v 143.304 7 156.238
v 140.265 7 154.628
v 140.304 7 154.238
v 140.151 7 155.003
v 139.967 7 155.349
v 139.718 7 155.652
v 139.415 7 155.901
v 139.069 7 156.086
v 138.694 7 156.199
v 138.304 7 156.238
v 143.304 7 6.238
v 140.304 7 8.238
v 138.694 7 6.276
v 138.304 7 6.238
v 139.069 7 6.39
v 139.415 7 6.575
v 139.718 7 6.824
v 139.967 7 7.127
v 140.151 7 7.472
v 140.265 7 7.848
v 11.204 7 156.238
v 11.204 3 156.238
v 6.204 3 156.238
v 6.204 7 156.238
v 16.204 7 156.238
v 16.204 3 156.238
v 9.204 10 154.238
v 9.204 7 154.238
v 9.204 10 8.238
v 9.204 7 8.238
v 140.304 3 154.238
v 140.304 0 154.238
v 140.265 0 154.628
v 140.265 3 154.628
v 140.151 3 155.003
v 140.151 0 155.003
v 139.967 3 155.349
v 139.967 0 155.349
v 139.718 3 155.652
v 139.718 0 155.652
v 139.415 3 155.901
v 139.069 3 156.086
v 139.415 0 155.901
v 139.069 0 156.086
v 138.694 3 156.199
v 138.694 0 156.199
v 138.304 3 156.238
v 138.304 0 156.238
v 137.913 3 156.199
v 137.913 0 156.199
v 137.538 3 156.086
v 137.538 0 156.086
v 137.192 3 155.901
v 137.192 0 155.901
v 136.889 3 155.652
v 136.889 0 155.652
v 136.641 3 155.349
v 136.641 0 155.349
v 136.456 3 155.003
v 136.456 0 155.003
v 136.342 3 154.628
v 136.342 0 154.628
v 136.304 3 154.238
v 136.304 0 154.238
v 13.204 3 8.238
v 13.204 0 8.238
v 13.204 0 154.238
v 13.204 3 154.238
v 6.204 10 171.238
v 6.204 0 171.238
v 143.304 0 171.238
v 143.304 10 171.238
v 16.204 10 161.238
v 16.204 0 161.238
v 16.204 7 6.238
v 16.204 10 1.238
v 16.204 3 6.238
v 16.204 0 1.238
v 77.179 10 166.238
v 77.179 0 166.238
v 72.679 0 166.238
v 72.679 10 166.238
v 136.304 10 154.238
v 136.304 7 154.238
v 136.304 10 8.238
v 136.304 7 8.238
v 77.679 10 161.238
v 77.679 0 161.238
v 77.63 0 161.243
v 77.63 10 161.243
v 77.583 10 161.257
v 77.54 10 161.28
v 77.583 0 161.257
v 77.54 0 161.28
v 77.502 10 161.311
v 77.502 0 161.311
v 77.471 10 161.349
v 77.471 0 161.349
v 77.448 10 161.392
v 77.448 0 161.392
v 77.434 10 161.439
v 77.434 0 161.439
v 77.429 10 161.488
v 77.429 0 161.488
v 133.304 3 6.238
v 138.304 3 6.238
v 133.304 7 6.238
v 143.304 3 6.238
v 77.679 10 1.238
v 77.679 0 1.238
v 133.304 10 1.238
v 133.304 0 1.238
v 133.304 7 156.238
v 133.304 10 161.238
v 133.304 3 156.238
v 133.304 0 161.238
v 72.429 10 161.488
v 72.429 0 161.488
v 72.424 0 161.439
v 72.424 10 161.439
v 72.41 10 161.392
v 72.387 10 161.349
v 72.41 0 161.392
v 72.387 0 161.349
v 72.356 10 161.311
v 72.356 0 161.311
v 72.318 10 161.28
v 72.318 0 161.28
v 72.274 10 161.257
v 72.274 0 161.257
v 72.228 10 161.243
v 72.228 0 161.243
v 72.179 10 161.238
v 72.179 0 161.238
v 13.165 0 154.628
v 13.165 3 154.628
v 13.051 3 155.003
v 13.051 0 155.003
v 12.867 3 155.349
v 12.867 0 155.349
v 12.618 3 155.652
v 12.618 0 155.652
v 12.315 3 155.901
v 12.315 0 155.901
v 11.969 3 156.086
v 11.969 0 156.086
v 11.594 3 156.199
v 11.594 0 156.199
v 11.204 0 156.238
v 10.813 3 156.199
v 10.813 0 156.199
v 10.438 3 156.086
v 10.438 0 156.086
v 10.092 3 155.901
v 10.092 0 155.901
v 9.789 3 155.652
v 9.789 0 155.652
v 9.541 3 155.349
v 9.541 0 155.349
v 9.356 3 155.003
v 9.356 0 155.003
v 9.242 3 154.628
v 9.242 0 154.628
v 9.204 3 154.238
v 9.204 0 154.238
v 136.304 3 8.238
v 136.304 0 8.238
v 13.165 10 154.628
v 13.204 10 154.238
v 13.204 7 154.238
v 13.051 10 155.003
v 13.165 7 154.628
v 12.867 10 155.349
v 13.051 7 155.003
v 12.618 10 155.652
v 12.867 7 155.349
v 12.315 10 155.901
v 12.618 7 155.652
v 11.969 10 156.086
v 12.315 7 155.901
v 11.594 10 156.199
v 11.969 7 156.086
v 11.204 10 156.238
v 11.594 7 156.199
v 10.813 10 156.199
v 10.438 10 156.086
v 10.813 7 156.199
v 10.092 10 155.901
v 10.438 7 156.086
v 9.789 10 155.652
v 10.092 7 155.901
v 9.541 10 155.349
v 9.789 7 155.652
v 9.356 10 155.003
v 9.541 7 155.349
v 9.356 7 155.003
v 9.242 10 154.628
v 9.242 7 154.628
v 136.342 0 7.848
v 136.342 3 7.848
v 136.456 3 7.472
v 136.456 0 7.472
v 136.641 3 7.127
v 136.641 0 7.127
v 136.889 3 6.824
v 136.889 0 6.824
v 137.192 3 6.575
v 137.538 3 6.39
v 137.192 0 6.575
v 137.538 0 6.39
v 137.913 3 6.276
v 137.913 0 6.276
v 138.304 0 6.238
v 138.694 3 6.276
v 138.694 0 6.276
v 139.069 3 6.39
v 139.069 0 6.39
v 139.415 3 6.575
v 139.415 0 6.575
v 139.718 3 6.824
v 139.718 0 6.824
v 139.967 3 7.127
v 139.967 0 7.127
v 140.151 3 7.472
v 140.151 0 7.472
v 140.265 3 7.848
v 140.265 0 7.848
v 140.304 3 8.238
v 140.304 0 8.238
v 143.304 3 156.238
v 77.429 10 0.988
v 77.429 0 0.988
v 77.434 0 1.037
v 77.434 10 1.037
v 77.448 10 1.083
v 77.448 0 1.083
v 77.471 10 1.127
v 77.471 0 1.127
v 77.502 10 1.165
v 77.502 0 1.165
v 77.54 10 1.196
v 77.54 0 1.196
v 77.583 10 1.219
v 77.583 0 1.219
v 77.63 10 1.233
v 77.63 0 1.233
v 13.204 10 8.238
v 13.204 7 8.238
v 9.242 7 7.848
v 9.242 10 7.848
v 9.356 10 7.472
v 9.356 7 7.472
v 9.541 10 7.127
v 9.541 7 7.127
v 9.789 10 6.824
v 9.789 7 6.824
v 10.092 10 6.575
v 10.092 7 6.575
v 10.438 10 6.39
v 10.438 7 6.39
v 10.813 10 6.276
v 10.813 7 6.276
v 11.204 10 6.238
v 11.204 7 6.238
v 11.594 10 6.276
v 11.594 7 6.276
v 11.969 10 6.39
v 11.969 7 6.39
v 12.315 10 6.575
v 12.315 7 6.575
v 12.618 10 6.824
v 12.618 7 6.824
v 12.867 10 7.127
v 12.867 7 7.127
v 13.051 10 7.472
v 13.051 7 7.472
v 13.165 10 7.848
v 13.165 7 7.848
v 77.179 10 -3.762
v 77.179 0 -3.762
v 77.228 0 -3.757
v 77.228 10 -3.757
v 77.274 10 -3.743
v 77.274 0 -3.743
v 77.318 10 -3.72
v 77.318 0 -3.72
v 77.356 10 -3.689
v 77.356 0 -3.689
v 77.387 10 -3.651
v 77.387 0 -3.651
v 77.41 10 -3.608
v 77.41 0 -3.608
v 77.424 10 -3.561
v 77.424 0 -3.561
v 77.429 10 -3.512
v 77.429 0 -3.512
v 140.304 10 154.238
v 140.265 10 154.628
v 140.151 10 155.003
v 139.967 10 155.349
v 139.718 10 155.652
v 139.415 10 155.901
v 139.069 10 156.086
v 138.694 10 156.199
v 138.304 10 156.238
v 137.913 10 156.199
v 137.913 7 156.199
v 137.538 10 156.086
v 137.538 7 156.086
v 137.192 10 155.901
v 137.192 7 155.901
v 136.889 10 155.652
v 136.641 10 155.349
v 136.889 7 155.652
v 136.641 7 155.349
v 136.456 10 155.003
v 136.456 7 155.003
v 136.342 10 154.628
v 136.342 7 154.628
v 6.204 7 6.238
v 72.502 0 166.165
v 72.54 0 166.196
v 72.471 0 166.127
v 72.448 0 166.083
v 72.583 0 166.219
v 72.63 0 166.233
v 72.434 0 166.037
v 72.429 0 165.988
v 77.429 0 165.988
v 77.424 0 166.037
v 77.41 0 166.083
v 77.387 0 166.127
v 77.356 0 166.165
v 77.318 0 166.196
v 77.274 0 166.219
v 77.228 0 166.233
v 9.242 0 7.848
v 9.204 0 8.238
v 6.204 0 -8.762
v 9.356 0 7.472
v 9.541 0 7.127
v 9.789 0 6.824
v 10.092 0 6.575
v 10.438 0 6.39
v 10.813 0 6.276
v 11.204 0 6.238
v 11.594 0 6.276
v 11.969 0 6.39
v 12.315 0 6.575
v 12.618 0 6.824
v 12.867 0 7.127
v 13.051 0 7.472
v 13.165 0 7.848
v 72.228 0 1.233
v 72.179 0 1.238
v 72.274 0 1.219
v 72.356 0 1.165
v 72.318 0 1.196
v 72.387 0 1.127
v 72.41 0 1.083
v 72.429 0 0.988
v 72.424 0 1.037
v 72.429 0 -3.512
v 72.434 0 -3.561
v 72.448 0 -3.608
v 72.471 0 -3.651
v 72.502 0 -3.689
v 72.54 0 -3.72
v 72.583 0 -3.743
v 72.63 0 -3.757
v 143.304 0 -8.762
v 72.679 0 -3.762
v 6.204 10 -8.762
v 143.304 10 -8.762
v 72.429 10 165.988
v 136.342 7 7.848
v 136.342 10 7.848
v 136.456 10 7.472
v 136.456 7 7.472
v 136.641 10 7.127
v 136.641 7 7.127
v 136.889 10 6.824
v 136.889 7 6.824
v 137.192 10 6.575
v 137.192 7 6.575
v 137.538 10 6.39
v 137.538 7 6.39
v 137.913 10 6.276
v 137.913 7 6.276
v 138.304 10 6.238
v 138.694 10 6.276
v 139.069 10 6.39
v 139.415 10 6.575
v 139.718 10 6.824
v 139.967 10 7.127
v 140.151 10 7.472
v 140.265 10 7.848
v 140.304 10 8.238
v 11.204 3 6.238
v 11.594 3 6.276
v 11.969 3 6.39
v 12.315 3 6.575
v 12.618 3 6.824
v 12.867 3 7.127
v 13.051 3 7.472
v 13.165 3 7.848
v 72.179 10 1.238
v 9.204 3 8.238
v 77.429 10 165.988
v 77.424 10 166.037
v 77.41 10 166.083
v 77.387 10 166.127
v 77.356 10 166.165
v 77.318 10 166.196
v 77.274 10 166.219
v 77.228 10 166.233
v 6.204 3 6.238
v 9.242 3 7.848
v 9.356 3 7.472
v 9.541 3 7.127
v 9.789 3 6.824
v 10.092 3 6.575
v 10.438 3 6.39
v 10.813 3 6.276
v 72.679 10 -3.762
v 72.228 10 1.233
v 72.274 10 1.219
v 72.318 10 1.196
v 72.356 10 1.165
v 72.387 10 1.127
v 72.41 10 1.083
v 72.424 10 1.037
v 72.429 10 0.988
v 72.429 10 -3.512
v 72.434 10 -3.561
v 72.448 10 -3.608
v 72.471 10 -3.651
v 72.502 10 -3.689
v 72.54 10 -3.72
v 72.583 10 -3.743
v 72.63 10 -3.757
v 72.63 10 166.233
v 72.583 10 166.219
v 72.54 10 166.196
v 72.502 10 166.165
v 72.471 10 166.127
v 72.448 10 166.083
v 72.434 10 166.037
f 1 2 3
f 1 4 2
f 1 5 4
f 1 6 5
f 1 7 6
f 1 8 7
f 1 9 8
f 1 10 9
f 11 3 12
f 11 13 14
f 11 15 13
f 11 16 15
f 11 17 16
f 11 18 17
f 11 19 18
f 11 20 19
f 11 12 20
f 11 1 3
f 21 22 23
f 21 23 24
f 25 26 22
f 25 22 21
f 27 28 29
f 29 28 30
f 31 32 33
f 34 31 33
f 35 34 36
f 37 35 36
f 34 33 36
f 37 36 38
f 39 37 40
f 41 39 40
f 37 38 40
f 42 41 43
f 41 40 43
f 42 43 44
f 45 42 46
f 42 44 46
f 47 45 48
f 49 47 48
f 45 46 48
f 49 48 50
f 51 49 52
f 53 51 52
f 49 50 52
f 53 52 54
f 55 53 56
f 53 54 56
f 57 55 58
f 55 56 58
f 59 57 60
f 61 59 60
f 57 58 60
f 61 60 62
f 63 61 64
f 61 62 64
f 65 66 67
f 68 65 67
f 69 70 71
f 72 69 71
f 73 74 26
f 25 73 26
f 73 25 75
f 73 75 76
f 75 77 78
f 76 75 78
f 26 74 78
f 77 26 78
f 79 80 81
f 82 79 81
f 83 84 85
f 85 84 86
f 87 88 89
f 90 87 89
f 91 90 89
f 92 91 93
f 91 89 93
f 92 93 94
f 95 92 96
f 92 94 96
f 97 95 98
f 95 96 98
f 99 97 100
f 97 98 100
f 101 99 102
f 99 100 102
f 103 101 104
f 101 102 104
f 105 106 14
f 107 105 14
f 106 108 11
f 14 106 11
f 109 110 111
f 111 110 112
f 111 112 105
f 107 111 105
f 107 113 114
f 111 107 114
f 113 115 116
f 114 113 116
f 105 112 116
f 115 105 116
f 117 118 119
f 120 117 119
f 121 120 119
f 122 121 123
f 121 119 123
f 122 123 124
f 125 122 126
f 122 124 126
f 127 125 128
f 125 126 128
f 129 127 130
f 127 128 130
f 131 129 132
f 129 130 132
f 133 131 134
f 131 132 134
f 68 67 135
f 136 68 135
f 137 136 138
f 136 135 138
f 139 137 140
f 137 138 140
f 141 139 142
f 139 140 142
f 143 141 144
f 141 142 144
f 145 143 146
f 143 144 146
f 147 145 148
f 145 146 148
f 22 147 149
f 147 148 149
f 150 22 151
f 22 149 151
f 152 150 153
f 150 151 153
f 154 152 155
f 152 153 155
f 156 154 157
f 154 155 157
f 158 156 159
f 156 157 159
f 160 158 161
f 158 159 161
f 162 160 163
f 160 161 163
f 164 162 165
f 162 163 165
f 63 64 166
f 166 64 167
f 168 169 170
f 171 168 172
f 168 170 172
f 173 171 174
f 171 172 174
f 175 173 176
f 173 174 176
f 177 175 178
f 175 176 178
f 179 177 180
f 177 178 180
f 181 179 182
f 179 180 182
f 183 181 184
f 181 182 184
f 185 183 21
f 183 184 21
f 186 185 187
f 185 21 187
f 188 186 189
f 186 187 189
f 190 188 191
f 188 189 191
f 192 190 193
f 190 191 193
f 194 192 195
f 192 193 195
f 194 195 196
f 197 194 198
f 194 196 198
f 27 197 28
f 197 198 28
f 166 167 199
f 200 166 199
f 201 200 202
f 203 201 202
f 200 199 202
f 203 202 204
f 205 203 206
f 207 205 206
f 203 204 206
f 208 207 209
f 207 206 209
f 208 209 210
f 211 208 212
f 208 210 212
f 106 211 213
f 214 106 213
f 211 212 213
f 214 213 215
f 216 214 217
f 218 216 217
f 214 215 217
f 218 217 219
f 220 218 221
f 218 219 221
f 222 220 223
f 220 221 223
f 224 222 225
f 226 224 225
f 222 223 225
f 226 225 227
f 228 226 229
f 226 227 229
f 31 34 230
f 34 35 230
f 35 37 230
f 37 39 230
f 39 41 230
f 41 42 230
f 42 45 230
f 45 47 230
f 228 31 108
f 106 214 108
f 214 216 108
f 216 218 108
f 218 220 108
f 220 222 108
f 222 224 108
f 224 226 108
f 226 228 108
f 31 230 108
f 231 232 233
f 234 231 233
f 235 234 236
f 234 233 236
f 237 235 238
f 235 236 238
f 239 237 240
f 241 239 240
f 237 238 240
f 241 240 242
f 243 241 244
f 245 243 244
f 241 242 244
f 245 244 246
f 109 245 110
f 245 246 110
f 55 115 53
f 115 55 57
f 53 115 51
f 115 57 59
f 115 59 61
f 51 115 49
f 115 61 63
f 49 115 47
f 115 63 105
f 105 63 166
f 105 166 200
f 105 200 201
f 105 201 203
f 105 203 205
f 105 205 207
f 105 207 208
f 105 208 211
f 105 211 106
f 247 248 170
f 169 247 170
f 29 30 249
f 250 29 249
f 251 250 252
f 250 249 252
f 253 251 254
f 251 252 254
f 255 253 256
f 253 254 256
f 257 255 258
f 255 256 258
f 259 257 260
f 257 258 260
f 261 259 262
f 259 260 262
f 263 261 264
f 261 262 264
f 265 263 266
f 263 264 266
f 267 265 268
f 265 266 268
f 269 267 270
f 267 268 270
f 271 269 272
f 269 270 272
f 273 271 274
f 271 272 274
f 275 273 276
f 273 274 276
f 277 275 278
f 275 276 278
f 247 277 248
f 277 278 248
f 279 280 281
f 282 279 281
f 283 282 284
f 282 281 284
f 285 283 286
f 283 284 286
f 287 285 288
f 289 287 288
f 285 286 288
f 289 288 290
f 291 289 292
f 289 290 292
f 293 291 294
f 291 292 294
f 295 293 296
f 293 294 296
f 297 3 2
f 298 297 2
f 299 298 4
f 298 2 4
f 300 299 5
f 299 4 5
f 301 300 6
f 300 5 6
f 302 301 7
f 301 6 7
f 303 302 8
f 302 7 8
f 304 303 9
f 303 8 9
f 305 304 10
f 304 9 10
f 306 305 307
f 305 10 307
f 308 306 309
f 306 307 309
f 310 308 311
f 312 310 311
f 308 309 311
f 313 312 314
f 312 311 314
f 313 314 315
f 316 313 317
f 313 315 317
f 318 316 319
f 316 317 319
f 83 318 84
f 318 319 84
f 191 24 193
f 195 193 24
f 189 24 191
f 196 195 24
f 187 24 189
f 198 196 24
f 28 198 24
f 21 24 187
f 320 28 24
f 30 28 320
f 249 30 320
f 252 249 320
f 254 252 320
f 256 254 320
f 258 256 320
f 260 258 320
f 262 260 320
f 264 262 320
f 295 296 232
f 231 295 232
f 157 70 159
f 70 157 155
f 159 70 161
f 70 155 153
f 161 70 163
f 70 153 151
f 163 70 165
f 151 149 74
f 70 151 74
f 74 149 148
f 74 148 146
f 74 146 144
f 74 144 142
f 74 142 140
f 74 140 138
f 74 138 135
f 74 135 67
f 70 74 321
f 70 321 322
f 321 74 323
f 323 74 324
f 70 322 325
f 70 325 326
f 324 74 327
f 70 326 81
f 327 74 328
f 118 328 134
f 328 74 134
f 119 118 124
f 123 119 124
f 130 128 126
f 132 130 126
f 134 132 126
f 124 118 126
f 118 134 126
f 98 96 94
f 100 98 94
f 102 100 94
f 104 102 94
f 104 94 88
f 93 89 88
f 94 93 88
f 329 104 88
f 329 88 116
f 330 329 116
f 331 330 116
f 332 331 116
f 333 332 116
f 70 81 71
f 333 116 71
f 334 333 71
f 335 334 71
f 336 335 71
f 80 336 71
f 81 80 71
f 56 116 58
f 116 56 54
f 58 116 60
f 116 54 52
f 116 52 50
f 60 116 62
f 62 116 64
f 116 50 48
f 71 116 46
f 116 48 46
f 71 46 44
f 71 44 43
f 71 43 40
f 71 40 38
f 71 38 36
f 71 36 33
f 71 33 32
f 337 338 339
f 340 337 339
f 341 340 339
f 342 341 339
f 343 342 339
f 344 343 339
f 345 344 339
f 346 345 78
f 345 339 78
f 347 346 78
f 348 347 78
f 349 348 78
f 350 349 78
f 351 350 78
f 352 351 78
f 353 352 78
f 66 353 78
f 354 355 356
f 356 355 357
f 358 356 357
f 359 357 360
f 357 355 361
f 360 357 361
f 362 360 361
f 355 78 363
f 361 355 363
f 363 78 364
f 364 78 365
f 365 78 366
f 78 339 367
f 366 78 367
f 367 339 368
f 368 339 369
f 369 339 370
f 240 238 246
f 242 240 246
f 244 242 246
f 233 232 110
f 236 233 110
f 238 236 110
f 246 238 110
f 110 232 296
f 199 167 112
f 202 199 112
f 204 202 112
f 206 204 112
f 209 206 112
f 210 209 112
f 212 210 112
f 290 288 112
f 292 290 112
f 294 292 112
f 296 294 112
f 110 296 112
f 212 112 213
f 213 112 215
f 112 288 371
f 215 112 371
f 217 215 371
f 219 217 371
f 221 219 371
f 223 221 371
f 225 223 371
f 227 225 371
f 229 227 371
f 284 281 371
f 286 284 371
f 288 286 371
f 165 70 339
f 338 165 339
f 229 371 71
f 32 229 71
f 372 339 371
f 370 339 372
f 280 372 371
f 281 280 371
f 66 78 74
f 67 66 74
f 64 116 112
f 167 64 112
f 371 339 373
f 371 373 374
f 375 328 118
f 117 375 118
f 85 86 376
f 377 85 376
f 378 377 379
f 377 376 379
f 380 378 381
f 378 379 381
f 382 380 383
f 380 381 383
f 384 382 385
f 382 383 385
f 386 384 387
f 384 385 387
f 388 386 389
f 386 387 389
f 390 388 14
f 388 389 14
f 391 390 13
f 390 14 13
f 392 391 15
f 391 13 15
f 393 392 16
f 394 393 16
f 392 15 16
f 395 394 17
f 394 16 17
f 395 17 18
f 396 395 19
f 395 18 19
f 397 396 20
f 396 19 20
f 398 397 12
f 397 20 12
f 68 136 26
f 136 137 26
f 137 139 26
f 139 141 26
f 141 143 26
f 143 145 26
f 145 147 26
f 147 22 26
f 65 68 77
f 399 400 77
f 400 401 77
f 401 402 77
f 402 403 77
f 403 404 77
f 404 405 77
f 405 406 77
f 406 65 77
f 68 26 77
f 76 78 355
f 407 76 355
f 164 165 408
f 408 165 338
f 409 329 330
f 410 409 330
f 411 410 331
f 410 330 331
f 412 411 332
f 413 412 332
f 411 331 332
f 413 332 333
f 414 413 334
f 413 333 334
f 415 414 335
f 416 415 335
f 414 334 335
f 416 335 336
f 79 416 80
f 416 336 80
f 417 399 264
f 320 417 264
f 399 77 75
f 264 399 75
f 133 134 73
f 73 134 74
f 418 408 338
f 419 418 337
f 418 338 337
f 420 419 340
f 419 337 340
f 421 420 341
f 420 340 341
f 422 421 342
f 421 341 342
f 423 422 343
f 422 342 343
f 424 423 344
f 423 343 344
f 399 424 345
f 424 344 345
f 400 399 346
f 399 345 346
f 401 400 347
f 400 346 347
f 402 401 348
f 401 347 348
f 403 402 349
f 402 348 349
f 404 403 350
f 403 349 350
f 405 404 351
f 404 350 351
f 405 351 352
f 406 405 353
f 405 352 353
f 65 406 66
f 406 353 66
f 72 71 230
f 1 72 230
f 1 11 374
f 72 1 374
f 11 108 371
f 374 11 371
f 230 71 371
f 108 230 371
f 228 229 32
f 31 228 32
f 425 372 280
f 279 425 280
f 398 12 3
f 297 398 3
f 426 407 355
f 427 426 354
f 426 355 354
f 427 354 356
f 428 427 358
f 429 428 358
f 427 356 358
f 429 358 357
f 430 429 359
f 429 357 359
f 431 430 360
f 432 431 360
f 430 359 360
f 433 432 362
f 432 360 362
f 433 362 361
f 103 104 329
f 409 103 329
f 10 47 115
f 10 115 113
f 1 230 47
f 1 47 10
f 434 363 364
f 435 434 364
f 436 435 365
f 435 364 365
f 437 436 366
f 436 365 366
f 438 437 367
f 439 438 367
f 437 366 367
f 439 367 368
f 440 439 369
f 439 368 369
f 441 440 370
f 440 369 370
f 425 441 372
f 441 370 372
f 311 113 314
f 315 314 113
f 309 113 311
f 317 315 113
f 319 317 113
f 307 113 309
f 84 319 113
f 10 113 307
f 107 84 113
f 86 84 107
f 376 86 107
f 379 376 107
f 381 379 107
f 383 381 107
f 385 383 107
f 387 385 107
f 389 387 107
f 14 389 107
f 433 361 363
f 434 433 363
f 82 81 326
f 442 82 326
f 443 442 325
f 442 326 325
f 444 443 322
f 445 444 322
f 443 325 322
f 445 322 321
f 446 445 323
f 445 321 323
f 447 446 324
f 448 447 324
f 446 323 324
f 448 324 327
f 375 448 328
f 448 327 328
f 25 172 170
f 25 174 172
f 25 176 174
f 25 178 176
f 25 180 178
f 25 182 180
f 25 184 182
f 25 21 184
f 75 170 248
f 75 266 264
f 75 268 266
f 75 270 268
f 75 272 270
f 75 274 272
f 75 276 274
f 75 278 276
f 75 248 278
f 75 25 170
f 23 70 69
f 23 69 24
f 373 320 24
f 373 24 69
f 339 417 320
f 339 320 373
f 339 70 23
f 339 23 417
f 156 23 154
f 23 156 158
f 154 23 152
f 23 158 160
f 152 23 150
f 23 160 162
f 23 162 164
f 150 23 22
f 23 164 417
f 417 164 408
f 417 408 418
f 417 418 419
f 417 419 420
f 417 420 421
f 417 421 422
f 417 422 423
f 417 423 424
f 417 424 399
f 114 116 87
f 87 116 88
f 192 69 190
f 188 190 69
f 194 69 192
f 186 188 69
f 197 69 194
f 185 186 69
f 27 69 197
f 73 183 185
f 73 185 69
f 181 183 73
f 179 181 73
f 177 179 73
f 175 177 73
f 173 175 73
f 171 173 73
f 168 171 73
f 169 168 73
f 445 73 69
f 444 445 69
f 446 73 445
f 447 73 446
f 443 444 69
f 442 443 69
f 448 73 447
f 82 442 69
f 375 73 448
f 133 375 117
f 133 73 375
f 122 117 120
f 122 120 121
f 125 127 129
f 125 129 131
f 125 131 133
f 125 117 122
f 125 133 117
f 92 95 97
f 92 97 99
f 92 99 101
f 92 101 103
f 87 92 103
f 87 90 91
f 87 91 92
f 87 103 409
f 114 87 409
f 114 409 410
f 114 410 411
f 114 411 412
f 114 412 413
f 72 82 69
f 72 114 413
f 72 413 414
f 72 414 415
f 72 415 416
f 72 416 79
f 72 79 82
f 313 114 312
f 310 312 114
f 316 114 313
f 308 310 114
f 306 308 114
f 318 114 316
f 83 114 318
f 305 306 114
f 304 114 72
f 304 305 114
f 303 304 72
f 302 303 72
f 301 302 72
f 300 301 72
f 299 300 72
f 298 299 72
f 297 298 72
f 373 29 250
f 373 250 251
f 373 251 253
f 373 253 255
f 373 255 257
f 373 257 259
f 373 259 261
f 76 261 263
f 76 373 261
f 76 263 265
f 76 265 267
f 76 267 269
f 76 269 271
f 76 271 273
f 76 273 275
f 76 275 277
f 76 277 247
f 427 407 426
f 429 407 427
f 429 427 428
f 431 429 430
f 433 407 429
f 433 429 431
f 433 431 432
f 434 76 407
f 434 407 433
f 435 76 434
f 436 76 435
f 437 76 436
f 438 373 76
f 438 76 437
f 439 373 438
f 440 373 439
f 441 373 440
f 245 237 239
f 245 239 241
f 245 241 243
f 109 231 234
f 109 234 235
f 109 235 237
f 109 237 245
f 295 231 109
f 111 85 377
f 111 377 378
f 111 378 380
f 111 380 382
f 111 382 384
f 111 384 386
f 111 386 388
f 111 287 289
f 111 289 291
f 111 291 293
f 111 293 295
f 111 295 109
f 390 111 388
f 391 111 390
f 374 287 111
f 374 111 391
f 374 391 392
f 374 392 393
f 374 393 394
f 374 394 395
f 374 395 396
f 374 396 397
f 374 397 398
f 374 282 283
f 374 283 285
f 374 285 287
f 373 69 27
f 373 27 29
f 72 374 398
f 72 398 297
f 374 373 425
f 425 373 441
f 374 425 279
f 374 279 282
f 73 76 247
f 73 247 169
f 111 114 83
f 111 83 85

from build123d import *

# Parameters (mm, degrees)
SKETCH1_W           = 137.099988832
SKETCH1_H           = 180
BOSS_EXTRUDE1_DEPTH = 10
SKETCH2_W           = 150
SKETCH2_H           = 4
CUT_EXTRUDE1_DEPTH  = 160


with BuildPart() as part:
    # Sketch1 → Boss-Extrude1 (new body)
    with BuildSketch(Plane(origin=(0, 0, 0), x_dir=(1, 0, 0), z_dir=(0, 1, 0))):
        with Locations((74.75359819, -81.23781213)):
            Rectangle(SKETCH1_W, SKETCH1_H)
        with BuildLine():
            Line((16.203603774, -1.23781213), (72.1788033, -1.23781213))
            ThreePointArc((72.1788033, -1.23781213), (72.355579995, -1.164588825), (72.4288033, -0.98781213))
            Line((72.4288033, -0.98781213), (72.4288033, 3.51218787))
            ThreePointArc((72.4288033, 3.51218787), (72.502026605, 3.688964566), (72.6788033, 3.76218787))
            Line((72.6788033, 3.76218787), (77.1788033, 3.76218787))
            ThreePointArc((77.1788033, 3.76218787), (77.355579995, 3.688964566), (77.4288033, 3.51218787))
            Line((77.4288033, 3.51218787), (77.4288033, -0.98781213))
            ThreePointArc((77.4288033, -0.98781213), (77.502026605, -1.164588825), (77.6788033, -1.23781213))
            Line((77.6788033, -1.23781213), (133.303592606, -1.23781213))
            Line((133.303592606, -1.23781213), (133.303592606, -161.23781213))
            Line((133.303592606, -161.23781213), (77.6788033, -161.23781213))
            ThreePointArc((77.6788033, -161.23781213), (77.502026605, -161.311035434), (77.4288033, -161.48781213))
            Line((77.4288033, -161.48781213), (77.4288033, -165.98781213))
            ThreePointArc((77.4288033, -165.98781213), (77.355579995, -166.164588825), (77.1788033, -166.23781213))
            Line((77.1788033, -166.23781213), (72.6788033, -166.23781213))
            ThreePointArc((72.6788033, -166.23781213), (72.502026605, -166.164588825), (72.4288033, -165.98781213))
            Line((72.4288033, -165.98781213), (72.4288033, -161.48781213))
            ThreePointArc((72.4288033, -161.48781213), (72.355579995, -161.311035434), (72.1788033, -161.23781213))
            Line((72.1788033, -161.23781213), (16.203603774, -161.23781213))
            Line((16.203603774, -161.23781213), (16.203603774, -1.23781213))
        make_face(mode=Mode.SUBTRACT)
        with BuildLine():
            Line((9.203603774, -154.23781213), (9.203603774, -8.23781213))
            ThreePointArc((9.203603774, -8.23781213), (11.203603774, -6.23781213), (13.203603774, -8.23781213))
            Line((13.203603774, -8.23781213), (13.203603774, -154.23781213))
            ThreePointArc((13.203603774, -154.23781213), (11.203603774, -156.23781213), (9.203603774, -154.23781213))
        make_face(mode=Mode.SUBTRACT)
        with BuildLine():
            Line((136.303592606, -154.23781213), (136.303592606, -8.23781213))
            ThreePointArc((136.303592606, -8.23781213), (138.303592606, -6.23781213), (140.303592606, -8.23781213))
            Line((140.303592606, -8.23781213), (140.303592606, -154.23781213))
            ThreePointArc((140.303592606, -154.23781213), (138.303592606, -156.23781213), (136.303592606, -154.23781213))
        make_face(mode=Mode.SUBTRACT)
    extrude(amount=BOSS_EXTRUDE1_DEPTH)

    # Sketch2 → Cut-Extrude1 (cut)
    with BuildSketch(Plane(origin=(143.303592606, 0, 0), x_dir=(0, 0, -1), z_dir=(1, 0, 0))):
        with Locations((-81.23781213, 5)):
            Rectangle(SKETCH2_W, SKETCH2_H)
    extrude(amount=-CUT_EXTRUDE1_DEPTH, mode=Mode.SUBTRACT)


solid = part.part
